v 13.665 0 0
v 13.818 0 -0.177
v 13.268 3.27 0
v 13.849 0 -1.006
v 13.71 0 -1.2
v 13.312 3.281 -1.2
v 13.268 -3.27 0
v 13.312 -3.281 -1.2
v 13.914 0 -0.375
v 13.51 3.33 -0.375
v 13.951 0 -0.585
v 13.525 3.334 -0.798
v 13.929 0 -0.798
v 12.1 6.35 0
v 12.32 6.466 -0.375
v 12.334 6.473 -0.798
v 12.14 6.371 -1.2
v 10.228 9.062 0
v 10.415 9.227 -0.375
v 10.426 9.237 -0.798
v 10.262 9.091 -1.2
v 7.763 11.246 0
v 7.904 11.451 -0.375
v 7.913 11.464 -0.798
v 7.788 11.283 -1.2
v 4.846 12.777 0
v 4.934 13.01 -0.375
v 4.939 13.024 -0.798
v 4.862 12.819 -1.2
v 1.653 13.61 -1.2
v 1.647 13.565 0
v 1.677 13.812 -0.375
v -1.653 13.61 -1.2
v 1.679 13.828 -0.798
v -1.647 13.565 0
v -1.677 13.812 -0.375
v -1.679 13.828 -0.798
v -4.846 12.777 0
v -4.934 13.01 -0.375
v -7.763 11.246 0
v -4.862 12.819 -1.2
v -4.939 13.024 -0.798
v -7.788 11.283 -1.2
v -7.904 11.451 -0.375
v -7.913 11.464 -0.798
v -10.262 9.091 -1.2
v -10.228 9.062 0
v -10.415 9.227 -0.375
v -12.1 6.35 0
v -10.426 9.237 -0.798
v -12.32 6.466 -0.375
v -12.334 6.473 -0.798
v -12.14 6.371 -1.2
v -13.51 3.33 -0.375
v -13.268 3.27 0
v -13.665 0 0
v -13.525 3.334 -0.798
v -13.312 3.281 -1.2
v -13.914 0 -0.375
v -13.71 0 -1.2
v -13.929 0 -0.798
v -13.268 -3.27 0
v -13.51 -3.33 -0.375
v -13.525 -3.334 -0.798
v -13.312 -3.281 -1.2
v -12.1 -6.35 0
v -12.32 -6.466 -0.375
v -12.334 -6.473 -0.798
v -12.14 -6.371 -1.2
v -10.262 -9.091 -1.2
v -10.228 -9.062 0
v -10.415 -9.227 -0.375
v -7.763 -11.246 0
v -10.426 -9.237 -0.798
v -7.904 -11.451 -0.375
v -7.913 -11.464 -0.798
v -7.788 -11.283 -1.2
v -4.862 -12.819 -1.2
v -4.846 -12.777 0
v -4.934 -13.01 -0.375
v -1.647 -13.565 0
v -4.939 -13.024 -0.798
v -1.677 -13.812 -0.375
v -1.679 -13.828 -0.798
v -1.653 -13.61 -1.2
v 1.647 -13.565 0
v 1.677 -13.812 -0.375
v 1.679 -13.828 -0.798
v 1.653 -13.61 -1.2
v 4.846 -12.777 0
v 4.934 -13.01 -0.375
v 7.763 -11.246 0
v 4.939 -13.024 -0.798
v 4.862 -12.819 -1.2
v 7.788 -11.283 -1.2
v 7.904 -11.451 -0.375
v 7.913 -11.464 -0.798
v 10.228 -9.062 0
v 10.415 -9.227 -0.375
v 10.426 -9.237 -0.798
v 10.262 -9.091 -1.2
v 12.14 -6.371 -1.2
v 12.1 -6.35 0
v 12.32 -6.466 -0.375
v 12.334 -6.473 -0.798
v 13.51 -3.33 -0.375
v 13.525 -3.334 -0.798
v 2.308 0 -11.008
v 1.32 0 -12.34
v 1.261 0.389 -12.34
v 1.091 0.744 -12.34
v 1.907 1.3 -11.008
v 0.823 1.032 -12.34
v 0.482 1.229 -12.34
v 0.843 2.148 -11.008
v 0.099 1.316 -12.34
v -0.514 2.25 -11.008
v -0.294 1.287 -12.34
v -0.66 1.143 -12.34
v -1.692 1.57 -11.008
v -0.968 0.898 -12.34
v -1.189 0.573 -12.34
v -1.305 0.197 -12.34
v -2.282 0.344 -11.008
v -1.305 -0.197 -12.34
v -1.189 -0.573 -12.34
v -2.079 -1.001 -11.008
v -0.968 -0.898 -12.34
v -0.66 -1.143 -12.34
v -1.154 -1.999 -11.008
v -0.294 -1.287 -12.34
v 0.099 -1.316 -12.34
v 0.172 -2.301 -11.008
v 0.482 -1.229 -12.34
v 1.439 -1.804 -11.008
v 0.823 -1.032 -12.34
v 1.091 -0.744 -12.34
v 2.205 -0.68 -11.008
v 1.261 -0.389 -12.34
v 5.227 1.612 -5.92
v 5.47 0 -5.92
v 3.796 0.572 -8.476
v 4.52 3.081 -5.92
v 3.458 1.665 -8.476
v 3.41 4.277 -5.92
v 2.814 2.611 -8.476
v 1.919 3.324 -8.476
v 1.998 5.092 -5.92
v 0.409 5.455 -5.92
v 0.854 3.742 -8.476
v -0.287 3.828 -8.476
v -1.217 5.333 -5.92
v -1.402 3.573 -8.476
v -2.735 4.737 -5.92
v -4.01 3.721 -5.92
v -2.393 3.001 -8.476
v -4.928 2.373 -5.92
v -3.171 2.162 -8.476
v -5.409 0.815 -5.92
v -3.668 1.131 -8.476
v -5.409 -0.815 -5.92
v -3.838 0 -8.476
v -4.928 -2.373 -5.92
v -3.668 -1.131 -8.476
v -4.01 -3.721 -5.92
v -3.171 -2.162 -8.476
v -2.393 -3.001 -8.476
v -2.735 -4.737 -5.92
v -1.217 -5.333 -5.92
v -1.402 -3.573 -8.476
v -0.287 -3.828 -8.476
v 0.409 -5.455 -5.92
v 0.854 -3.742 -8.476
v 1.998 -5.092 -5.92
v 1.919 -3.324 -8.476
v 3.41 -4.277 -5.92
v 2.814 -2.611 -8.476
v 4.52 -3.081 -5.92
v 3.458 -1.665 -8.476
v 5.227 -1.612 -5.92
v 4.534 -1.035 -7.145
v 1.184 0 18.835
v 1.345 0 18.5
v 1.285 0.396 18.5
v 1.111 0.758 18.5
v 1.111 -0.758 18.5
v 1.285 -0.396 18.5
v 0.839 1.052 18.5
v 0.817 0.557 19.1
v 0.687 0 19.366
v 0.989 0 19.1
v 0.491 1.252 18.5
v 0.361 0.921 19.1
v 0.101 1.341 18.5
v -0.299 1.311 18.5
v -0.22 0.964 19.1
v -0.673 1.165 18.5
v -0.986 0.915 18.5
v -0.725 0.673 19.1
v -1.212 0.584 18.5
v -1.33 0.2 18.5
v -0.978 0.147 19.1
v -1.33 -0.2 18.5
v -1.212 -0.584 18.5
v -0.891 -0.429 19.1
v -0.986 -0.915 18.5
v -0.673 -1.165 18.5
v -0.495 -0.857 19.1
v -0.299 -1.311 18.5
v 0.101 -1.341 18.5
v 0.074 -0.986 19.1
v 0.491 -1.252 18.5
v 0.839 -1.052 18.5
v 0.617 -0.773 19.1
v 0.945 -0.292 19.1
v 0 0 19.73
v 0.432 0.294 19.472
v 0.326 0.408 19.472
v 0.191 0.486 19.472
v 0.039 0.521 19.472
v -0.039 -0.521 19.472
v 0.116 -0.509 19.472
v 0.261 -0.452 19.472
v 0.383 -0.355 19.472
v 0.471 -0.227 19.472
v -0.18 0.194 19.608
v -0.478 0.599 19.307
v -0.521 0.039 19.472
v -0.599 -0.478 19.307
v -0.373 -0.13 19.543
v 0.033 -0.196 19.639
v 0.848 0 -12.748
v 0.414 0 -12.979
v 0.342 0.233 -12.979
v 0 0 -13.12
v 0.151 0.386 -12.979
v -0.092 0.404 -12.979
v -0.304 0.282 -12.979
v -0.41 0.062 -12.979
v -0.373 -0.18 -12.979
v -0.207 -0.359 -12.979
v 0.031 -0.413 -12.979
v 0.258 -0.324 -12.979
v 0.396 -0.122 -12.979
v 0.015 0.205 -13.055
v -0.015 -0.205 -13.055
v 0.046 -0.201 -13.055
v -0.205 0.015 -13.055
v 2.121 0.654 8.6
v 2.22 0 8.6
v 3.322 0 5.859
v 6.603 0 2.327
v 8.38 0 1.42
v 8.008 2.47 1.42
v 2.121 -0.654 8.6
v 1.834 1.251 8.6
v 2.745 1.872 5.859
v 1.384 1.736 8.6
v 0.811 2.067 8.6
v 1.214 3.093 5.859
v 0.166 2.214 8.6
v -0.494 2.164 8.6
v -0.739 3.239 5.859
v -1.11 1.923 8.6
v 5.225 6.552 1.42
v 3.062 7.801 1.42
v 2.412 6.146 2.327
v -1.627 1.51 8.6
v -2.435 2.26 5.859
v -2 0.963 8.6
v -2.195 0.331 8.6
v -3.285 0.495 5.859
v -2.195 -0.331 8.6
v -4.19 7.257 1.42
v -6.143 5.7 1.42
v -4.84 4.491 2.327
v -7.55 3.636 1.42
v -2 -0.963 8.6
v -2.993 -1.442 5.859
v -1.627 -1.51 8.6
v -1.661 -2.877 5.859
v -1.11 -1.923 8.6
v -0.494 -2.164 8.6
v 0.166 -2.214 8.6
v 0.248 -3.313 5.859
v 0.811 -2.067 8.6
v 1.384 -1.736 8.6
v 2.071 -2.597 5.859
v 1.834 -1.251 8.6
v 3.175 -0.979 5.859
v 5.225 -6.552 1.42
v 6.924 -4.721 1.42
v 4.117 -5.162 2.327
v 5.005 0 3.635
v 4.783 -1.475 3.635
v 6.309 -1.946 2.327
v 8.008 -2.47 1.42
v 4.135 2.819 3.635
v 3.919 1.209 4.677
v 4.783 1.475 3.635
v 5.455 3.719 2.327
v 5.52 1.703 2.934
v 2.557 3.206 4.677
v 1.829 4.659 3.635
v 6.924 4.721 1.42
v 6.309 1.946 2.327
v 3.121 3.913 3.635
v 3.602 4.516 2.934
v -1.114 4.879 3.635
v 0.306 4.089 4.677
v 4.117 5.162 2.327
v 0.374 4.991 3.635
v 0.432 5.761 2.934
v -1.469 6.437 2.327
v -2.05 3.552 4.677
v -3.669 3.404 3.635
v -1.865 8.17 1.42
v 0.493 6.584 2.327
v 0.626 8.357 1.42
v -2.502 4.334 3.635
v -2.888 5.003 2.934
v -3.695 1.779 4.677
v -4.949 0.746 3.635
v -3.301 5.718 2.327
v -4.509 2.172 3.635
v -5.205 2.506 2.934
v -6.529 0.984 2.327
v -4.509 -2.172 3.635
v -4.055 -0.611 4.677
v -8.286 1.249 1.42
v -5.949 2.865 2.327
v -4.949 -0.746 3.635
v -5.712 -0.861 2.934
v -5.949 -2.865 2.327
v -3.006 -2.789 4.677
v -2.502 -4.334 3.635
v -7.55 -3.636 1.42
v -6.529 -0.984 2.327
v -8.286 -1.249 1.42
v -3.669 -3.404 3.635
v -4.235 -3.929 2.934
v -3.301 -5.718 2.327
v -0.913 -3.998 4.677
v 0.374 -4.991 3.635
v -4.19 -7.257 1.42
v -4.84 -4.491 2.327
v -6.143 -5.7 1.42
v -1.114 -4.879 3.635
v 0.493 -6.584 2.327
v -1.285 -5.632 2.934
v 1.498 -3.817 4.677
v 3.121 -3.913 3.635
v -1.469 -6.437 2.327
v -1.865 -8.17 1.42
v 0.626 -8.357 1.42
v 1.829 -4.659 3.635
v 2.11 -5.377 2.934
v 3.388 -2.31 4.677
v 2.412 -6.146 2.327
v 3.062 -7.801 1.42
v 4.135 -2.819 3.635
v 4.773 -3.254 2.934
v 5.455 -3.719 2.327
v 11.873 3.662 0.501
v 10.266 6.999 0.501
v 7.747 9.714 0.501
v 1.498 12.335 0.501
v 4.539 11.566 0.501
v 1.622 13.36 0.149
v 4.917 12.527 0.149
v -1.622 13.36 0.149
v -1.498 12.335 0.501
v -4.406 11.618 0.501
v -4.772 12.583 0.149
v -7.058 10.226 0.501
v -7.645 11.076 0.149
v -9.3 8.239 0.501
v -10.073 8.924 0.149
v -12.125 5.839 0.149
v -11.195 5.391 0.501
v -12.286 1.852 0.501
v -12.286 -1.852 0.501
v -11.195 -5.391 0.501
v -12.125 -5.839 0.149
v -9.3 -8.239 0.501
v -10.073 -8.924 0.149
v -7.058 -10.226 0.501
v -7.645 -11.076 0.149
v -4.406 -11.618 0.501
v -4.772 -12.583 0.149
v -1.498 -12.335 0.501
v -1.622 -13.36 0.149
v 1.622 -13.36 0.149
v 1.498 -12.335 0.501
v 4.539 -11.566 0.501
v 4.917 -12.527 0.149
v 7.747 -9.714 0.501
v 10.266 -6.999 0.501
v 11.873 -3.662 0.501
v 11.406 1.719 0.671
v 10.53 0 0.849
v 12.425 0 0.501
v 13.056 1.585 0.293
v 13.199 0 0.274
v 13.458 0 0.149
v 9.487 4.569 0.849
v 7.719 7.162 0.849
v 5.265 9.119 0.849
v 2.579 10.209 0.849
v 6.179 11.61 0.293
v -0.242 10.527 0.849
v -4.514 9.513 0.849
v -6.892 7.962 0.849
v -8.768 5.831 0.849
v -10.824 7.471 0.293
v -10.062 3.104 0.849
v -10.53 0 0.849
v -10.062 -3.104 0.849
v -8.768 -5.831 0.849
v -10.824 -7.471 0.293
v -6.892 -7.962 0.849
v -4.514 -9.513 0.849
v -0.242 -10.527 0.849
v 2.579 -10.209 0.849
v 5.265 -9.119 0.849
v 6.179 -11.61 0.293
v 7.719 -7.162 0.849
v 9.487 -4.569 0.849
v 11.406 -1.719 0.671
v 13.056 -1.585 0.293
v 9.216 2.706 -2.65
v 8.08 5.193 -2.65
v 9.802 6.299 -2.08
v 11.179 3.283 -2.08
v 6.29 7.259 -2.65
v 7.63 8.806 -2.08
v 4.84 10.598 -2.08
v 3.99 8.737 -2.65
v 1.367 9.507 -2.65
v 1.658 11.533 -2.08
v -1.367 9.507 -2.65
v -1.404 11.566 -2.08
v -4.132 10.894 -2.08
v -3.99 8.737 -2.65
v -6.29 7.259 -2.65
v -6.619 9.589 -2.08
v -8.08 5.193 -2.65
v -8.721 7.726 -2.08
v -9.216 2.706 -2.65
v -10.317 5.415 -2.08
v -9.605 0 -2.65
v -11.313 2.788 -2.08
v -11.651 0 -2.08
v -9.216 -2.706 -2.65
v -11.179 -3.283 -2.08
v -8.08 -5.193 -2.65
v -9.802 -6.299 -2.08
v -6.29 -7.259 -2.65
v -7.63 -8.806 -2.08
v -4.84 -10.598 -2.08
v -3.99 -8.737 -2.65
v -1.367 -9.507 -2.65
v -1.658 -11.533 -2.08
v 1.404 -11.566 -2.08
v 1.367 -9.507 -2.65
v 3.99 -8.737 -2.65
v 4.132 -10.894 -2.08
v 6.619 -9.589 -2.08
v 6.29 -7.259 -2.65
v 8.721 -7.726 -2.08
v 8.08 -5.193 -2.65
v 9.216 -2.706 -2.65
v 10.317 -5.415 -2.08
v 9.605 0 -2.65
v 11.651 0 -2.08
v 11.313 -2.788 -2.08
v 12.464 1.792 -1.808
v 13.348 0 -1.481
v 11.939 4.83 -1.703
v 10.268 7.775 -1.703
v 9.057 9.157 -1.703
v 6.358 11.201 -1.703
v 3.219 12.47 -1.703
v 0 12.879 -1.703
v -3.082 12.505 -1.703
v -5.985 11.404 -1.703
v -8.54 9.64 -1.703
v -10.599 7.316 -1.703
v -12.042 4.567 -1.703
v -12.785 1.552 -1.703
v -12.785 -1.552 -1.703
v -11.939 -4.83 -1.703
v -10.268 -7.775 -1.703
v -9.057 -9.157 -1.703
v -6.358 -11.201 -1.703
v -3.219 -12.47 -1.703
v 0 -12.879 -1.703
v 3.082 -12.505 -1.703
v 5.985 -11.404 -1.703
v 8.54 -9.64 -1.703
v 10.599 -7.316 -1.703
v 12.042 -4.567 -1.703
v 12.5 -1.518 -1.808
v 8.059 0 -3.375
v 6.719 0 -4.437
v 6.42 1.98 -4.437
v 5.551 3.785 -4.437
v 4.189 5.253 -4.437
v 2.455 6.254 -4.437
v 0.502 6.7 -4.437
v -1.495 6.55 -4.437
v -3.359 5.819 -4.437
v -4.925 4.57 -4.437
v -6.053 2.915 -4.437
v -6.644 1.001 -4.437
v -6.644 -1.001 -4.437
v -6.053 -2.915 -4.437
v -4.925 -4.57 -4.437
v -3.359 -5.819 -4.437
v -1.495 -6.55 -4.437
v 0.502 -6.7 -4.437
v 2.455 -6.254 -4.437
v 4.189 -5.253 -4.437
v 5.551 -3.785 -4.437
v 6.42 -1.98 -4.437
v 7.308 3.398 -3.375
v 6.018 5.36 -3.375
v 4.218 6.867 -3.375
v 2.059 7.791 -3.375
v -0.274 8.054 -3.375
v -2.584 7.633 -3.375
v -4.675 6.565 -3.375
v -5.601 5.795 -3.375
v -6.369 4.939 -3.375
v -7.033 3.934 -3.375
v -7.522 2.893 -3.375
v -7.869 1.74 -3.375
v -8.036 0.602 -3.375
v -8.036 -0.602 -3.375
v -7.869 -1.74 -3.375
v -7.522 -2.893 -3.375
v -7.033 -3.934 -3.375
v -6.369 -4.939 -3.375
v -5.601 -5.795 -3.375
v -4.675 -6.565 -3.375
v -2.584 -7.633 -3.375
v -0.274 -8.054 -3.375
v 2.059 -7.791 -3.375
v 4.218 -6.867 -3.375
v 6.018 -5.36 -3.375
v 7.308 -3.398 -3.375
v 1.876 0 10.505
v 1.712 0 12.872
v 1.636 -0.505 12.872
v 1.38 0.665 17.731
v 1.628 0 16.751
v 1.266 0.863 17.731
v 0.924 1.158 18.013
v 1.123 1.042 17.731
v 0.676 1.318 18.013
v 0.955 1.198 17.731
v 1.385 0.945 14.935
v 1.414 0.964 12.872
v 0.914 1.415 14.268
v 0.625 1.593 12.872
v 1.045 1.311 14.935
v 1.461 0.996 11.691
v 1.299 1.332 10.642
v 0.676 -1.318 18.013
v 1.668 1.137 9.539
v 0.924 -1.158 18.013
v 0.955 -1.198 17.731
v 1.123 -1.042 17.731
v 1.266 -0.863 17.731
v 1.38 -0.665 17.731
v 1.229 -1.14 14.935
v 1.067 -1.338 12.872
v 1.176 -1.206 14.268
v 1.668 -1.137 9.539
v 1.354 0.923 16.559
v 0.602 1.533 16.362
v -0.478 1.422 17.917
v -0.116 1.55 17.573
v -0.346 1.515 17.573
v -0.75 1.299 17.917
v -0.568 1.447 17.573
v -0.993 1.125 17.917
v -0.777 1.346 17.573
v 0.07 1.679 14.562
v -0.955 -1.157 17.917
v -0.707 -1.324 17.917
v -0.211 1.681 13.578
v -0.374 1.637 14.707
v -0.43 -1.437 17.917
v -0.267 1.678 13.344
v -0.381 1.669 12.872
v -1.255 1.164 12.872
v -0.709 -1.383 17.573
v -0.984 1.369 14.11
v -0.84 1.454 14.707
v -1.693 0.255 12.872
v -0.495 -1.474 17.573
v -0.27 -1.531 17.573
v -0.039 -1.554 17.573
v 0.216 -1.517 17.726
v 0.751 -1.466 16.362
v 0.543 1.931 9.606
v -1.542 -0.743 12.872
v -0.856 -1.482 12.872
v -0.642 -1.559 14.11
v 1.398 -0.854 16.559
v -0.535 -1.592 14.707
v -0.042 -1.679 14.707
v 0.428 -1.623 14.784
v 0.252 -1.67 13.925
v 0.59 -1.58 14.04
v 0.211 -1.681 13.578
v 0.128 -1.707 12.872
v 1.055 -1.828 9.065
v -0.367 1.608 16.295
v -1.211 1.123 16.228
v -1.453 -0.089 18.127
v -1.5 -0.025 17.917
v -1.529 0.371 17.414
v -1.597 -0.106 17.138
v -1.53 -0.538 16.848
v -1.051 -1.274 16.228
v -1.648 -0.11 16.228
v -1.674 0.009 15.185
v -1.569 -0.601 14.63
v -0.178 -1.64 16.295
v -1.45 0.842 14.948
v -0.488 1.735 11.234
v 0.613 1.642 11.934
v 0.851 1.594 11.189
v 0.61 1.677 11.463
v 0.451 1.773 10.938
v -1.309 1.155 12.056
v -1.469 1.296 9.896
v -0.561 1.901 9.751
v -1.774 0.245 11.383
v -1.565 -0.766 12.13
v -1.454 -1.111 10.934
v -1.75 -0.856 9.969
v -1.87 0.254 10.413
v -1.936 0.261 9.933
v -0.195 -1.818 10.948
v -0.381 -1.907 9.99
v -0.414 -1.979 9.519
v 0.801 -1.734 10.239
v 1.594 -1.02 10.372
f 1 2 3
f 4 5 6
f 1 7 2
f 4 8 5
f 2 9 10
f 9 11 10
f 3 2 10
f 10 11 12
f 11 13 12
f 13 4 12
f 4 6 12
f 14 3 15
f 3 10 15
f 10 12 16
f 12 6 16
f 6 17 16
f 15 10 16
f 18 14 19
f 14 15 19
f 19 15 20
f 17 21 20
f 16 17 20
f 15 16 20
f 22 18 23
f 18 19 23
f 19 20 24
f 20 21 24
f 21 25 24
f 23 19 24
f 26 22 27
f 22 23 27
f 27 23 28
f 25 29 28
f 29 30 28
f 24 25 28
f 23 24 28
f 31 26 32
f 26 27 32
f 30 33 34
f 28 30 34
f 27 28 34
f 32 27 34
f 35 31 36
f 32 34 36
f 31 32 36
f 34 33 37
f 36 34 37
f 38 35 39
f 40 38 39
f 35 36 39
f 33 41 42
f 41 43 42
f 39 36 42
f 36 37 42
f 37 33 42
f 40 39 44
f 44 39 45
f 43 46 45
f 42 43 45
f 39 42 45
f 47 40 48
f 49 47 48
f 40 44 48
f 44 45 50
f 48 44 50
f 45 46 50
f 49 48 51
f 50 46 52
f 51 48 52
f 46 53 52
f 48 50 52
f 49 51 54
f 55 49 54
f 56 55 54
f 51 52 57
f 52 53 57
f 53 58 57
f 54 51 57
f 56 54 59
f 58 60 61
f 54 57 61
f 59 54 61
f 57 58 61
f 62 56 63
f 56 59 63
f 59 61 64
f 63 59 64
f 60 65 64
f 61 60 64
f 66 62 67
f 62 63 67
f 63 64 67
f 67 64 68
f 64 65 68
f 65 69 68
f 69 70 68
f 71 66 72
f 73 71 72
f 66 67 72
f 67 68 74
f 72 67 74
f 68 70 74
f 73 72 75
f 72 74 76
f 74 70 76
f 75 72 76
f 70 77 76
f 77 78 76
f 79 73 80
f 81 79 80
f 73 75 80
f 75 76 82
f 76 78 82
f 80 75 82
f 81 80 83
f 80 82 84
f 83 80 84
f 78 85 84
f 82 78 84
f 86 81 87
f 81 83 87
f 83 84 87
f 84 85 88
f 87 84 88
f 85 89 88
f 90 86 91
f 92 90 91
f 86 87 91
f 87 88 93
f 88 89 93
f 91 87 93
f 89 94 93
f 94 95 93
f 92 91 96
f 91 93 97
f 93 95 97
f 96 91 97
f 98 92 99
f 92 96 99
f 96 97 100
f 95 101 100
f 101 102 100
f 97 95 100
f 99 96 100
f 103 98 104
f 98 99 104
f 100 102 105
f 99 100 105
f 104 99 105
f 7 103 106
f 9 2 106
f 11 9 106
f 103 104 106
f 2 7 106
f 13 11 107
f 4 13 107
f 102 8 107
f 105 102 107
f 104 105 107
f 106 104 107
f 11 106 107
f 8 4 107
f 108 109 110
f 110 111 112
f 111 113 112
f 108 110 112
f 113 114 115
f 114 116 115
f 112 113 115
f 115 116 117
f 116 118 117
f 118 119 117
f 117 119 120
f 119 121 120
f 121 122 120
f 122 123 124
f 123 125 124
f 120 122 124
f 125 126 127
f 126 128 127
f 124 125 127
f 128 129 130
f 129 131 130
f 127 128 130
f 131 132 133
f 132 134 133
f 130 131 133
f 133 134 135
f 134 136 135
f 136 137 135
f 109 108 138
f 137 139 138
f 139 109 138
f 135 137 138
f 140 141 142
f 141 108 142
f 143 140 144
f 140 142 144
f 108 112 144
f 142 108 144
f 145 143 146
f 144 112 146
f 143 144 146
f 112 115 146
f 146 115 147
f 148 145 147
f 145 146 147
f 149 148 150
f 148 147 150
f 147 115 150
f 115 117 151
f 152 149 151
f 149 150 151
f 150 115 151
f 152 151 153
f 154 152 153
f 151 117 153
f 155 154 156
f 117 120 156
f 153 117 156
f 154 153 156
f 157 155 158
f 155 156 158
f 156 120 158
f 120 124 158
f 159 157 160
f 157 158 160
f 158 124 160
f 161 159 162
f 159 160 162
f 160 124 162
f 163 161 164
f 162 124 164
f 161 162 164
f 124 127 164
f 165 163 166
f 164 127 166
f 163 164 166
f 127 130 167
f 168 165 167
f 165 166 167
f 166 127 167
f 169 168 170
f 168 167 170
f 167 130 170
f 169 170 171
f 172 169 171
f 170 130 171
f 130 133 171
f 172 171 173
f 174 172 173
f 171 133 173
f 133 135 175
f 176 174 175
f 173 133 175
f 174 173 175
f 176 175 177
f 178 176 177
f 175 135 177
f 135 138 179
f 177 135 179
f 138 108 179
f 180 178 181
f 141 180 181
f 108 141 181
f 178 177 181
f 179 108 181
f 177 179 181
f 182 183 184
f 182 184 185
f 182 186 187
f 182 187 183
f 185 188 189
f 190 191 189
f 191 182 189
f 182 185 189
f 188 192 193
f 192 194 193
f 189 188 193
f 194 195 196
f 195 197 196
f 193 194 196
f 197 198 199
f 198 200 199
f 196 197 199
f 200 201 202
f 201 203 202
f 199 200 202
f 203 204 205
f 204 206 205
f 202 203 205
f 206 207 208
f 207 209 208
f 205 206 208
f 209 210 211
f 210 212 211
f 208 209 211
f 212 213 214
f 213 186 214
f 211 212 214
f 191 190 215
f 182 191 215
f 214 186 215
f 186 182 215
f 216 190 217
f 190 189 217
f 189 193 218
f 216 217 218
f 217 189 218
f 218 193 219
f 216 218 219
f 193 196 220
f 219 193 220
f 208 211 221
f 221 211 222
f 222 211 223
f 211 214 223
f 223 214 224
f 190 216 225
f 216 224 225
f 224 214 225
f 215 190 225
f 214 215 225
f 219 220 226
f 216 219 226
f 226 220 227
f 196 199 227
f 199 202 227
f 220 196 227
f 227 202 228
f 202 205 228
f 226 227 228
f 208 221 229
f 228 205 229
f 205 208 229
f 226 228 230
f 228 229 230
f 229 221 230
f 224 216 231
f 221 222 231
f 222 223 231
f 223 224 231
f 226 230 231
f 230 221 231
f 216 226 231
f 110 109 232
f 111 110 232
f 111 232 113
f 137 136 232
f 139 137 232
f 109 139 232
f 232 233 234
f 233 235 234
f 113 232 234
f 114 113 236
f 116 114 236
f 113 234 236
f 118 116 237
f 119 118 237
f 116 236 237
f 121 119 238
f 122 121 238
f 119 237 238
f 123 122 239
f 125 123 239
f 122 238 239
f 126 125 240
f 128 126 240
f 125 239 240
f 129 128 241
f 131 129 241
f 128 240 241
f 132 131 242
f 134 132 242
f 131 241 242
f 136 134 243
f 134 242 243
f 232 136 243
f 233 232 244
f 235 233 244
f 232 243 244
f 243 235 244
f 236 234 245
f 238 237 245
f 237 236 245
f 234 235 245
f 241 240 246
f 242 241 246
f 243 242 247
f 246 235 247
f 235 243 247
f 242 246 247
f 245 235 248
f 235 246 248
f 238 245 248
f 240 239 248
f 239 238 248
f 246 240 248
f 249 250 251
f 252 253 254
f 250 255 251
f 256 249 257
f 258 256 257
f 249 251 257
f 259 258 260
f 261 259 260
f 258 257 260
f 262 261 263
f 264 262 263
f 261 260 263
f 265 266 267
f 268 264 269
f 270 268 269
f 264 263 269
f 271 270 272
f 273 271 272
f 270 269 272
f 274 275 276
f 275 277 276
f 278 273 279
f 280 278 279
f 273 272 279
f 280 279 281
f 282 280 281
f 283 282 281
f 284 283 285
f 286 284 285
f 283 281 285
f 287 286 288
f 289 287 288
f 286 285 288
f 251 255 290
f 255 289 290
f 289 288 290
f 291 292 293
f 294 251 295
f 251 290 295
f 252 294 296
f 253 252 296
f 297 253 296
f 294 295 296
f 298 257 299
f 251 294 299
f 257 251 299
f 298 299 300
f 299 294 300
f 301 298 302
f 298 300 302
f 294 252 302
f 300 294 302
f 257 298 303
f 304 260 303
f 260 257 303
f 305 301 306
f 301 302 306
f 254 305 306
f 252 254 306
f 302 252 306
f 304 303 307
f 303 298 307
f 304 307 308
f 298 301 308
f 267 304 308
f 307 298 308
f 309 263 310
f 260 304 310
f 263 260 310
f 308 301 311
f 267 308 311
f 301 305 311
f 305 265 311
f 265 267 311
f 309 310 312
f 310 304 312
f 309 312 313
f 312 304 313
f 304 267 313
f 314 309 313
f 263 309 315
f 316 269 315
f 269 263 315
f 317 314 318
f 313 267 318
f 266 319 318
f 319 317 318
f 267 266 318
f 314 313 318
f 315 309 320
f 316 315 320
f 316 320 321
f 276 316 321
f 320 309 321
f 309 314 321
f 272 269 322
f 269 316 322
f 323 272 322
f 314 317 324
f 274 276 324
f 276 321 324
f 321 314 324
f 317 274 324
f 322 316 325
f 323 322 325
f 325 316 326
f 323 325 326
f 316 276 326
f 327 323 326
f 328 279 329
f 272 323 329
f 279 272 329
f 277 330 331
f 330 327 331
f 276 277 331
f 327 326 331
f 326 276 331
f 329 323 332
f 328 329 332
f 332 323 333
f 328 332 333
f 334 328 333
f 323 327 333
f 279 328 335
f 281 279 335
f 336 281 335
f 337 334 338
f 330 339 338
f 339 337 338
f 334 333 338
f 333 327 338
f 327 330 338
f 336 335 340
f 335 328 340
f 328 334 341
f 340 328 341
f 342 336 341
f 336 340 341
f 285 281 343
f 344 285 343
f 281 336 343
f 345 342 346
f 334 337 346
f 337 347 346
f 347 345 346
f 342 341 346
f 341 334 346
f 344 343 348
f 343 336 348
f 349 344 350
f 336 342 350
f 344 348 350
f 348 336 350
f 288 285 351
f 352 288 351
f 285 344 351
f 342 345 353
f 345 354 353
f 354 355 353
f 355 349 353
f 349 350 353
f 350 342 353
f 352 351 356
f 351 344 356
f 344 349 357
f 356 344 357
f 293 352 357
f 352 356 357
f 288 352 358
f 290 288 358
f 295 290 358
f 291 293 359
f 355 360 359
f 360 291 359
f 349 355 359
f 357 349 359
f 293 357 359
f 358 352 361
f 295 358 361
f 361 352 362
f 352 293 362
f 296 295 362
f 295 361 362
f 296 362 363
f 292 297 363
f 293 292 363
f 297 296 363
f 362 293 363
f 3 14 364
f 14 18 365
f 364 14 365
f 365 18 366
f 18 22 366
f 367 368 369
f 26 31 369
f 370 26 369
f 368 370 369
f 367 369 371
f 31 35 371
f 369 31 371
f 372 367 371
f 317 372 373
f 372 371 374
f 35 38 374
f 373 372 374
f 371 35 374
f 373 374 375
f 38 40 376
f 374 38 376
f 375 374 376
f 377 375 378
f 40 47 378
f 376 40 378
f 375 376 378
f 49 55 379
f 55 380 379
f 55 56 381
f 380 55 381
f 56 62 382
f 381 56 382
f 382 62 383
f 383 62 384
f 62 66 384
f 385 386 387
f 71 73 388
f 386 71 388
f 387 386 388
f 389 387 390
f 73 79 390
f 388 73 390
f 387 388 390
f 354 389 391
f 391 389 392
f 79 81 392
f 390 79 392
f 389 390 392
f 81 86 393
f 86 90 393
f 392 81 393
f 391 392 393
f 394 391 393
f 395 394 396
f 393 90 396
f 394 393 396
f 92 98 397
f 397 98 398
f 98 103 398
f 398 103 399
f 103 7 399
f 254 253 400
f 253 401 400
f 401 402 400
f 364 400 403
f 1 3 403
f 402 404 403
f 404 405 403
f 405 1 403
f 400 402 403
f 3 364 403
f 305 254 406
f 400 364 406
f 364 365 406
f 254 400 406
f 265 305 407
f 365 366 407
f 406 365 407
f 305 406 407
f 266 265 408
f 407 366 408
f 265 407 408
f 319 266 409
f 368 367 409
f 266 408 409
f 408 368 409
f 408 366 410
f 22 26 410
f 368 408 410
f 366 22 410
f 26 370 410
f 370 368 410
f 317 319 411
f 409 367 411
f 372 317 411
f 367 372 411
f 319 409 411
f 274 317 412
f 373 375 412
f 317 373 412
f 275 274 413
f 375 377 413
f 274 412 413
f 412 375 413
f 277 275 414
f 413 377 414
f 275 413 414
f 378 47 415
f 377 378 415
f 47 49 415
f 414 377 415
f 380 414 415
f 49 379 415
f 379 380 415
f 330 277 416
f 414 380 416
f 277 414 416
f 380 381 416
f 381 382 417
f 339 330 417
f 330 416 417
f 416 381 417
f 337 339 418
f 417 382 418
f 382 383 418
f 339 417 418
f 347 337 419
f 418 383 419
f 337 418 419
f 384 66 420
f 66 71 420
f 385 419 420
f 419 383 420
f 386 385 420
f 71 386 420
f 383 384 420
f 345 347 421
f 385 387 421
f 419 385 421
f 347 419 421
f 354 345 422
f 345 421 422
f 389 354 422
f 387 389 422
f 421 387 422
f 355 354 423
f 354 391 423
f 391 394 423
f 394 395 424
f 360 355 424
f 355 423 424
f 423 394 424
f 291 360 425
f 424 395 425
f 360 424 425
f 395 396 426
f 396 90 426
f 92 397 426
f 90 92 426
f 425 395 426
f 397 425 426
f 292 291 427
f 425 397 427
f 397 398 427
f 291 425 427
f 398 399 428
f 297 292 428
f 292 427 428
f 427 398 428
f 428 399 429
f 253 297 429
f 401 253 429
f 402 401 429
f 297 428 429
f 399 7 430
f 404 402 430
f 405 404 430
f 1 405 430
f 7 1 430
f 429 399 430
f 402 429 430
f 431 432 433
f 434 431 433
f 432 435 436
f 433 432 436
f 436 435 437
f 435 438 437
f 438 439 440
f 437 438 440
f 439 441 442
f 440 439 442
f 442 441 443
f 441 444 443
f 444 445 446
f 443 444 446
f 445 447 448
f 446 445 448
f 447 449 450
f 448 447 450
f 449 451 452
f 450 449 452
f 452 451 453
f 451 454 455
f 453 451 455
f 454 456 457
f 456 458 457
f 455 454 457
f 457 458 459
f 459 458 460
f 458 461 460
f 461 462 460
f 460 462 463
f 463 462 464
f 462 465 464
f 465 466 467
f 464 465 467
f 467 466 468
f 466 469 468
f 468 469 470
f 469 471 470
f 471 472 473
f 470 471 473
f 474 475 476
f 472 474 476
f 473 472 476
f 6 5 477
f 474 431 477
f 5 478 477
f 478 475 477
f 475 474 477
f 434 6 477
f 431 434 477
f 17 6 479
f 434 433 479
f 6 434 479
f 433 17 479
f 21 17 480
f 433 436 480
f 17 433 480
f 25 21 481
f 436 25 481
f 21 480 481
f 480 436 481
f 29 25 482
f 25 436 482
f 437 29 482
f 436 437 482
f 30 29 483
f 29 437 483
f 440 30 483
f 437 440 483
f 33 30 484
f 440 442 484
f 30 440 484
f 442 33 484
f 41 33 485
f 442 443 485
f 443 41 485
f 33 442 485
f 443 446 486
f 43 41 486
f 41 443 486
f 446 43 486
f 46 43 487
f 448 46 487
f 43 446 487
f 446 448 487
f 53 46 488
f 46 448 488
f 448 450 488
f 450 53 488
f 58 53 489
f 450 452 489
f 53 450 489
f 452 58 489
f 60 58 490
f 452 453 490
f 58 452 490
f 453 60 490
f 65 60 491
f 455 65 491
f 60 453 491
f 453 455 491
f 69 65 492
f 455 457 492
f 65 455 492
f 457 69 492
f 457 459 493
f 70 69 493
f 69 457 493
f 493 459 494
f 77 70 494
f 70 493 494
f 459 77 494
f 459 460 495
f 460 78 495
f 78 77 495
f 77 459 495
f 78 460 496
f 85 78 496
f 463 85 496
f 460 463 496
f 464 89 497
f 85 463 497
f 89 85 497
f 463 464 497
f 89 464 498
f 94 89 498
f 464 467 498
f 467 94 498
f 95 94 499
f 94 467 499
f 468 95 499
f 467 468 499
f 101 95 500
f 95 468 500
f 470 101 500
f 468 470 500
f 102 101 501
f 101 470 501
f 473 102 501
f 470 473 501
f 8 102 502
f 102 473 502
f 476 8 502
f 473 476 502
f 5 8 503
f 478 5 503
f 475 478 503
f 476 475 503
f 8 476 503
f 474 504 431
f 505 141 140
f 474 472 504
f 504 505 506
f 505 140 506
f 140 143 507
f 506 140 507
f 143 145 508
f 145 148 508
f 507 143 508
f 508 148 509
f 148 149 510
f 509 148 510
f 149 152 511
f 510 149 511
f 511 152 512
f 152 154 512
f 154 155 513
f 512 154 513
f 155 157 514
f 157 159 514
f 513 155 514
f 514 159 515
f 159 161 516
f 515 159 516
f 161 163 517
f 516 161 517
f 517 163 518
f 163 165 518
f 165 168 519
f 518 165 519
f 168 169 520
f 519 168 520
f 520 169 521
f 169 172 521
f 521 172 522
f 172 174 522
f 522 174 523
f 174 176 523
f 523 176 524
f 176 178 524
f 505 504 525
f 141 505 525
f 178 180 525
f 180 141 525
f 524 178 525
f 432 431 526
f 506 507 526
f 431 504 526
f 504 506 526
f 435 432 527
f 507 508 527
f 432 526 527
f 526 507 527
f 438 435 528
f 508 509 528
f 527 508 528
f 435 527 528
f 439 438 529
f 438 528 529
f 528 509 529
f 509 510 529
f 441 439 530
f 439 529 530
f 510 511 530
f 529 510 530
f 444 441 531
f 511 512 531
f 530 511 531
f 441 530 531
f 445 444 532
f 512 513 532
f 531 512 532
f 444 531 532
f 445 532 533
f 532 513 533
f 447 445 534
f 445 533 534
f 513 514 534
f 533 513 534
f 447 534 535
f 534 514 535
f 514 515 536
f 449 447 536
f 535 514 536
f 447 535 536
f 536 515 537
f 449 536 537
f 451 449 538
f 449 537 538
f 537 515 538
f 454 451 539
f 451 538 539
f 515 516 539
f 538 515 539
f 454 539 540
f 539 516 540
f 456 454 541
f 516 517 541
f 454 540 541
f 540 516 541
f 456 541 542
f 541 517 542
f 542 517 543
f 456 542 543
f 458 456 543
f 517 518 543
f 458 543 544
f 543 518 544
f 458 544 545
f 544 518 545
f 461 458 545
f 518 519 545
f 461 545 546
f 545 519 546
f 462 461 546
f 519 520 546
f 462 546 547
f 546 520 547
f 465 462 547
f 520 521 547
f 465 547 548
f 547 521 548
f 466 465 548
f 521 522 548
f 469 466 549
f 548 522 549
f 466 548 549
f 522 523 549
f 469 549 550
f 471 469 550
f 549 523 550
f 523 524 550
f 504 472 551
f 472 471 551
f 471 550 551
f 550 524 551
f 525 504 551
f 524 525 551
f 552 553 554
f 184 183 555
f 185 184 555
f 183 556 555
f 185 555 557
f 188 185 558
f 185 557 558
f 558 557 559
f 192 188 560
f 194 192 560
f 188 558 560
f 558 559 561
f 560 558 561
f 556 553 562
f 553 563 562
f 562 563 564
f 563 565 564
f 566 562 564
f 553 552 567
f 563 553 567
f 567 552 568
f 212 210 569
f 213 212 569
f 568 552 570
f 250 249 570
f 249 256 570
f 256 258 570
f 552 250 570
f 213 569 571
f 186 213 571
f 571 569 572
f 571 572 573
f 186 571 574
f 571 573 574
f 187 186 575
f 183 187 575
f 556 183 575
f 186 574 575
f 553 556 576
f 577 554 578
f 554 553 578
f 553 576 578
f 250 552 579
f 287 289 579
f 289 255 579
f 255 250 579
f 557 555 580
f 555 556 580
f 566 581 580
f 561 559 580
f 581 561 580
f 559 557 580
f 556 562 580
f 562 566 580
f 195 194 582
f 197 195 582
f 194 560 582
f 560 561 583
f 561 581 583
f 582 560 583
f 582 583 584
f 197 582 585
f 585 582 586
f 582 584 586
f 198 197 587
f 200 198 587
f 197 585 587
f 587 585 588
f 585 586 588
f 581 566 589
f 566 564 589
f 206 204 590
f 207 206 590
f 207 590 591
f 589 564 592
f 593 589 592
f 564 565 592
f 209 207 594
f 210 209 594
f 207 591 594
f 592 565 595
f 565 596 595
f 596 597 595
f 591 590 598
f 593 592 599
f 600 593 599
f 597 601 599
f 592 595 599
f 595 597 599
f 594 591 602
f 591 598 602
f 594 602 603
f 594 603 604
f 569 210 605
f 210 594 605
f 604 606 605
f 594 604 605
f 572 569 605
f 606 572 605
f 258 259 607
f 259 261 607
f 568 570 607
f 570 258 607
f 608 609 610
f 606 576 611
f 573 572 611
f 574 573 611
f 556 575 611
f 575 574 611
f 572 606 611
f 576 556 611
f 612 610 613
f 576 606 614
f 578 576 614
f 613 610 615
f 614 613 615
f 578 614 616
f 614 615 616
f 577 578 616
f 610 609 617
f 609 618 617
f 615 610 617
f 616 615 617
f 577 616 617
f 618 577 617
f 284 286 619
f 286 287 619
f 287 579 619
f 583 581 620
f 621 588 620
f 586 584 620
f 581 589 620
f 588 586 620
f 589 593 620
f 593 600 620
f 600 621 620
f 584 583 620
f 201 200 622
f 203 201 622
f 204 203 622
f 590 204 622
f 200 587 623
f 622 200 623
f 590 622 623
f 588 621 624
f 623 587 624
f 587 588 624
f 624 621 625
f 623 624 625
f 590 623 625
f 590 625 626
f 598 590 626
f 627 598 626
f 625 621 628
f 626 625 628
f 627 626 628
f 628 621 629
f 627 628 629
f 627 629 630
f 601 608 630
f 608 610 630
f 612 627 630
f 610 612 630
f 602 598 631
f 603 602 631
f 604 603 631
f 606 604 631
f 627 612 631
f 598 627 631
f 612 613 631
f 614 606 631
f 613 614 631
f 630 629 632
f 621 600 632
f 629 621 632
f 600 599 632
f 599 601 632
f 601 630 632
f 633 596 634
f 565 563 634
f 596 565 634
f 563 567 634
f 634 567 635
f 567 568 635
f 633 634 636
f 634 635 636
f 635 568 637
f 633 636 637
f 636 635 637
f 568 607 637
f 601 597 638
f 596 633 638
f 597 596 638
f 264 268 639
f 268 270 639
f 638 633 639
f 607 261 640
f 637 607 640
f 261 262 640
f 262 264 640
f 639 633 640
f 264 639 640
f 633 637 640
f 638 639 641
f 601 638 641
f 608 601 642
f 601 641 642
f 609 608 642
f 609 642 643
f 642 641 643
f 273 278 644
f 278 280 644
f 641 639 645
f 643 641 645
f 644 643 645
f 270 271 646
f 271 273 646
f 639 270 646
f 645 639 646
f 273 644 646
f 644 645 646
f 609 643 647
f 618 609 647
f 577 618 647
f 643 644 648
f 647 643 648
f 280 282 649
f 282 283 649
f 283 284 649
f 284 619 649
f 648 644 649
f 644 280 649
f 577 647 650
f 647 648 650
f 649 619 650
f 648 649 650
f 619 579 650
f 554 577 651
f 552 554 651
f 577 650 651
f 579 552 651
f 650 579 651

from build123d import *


with BuildPart() as f1:
    # F0 (on Front) → F1 (revolve)
    with BuildSketch(Plane.XZ):
        with BuildLine():
            Line((13.665, 0), (0, 0))
            Line((0, 0), (0, -1.2))
            Line((0, -1.2), (13.71, -1.2))
            add(Edge.make_bspline(
                [(13.665, 0), (14.0298880486, -0.328891577), (14.0474355227, -0.831321565), (13.71, -1.2)],
                knots=[0.5112427618, 0.5112427618, 0.5112427618, 0.5112427618, 0.5677312504, 0.5677312504, 0.5677312504, 0.5677312504], degree=3))
        make_face()
        with BuildLine():
            Line((0, 1.42), (0, 0))
            Line((0, 0), (13.665, 0))
            add(Edge.make_bspline(
                [(8.38, 1.42), (10.5242206514, 0.6133605516), (12.8860545622, 0.7021019033), (13.665, 0)],
                knots=[0.3906538561, 0.3906538561, 0.3906538561, 0.3906538561, 0.5112427618, 0.5112427618, 0.5112427618, 0.5112427618], degree=3))
            Line((8.38, 1.42), (0, 1.42))
        make_face()
        with BuildLine():
            Line((0, 8.6), (0, 1.42))
            Line((0, 1.42), (8.38, 1.42))
            add(Edge.make_bspline(
                [(2.22, 8.6), (3.1177109994, 5.0890195473), (5.5607589495, 2.480576972), (8.38, 1.42)],
                knots=[0.2321024529, 0.2321024529, 0.2321024529, 0.2321024529, 0.3906538561, 0.3906538561, 0.3906538561, 0.3906538561], degree=3))
            Line((2.22, 8.6), (0, 8.6))
        make_face()
        with BuildLine():
            Line((13.71, -1.2), (0, -1.2))
            Line((0, -1.2), (0, -2.65))
            Line((0, -2.65), (9.605, -2.65))
            add(Edge.make_bspline(
                [(13.71, -1.2), (13.0675044846, -1.901983713), (11.1380456973, -2.1190615636), (9.605, -2.65)],
                knots=[0.5677312504, 0.5677312504, 0.5677312504, 0.5677312504, 0.6752883929, 0.6752883929, 0.6752883929, 0.6752883929], degree=3))
        make_face()
        with BuildLine():
            Line((0, 18.5), (0, 8.6))
            Line((0, 8.6), (2.22, 8.6))
            add(Edge.make_bspline(
                [(1.345, 18.5), (2.0032143028, 16.7454299033), (1.2998774793, 12.1986327297), (2.22, 8.6)],
                knots=[0.0695927845, 0.0695927845, 0.0695927845, 0.0695927845, 0.2321024529, 0.2321024529, 0.2321024529, 0.2321024529], degree=3))
            Line((1.345, 18.5), (0, 18.5))
        make_face()
        with BuildLine():
            Line((9.605, -2.65), (0, -2.65))
            Line((0, -2.65), (0, -5.92))
            Line((0, -5.92), (5.47, -5.92))
            add(Edge.make_bspline(
                [(9.605, -2.65), (7.9180231055, -3.2342492994), (6.7110625877, -4.198552197), (5.47, -5.92)],
                knots=[0.6752883929, 0.6752883929, 0.6752883929, 0.6752883929, 0.7936452133, 0.7936452133, 0.7936452133, 0.7936452133], degree=3))
        make_face()
        with BuildLine():
            Line((0, 19.73), (0, 18.5))
            Line((0, 18.5), (1.345, 18.5))
            add(Edge.make_bspline(
                [(0, 19.73), (0.5315638743, 19.4906866276), (1.0631277486, 19.2513732553), (1.345, 18.5)],
                knots=[0, 0, 0, 0, 0.0695927845, 0.0695927845, 0.0695927845, 0.0695927845], degree=3))
        make_face()
        with BuildLine():
            Line((5.47, -5.92), (0, -5.92))
            Line((0, -5.92), (0, -12.34))
            Line((0, -12.34), (1.32, -12.34))
            add(Edge.make_bspline(
                [(5.47, -5.92), (3.9755112158, -7.992969131), (2.4315710199, -11.1638740892), (1.32, -12.34)],
                knots=[0.7936452133, 0.7936452133, 0.7936452133, 0.7936452133, 0.9361706123, 0.9361706123, 0.9361706123, 0.9361706123], degree=3))
        make_face()
        with BuildLine():
            Line((1.32, -12.34), (0, -12.34))
            Line((0, -12.34), (0, -13.12))
            add(Edge.make_bspline(
                [(1.32, -12.34), (0.8221876943, -12.8667229363), (0.4110938471, -12.9933614681), (0, -13.12)],
                knots=[0.9361706123, 0.9361706123, 0.9361706123, 0.9361706123, 1, 1, 1, 1], degree=3))
        make_face()
    revolve(axis=Axis((0, 0, 9.865), (0, 0, 1)))


solid = f1.part
